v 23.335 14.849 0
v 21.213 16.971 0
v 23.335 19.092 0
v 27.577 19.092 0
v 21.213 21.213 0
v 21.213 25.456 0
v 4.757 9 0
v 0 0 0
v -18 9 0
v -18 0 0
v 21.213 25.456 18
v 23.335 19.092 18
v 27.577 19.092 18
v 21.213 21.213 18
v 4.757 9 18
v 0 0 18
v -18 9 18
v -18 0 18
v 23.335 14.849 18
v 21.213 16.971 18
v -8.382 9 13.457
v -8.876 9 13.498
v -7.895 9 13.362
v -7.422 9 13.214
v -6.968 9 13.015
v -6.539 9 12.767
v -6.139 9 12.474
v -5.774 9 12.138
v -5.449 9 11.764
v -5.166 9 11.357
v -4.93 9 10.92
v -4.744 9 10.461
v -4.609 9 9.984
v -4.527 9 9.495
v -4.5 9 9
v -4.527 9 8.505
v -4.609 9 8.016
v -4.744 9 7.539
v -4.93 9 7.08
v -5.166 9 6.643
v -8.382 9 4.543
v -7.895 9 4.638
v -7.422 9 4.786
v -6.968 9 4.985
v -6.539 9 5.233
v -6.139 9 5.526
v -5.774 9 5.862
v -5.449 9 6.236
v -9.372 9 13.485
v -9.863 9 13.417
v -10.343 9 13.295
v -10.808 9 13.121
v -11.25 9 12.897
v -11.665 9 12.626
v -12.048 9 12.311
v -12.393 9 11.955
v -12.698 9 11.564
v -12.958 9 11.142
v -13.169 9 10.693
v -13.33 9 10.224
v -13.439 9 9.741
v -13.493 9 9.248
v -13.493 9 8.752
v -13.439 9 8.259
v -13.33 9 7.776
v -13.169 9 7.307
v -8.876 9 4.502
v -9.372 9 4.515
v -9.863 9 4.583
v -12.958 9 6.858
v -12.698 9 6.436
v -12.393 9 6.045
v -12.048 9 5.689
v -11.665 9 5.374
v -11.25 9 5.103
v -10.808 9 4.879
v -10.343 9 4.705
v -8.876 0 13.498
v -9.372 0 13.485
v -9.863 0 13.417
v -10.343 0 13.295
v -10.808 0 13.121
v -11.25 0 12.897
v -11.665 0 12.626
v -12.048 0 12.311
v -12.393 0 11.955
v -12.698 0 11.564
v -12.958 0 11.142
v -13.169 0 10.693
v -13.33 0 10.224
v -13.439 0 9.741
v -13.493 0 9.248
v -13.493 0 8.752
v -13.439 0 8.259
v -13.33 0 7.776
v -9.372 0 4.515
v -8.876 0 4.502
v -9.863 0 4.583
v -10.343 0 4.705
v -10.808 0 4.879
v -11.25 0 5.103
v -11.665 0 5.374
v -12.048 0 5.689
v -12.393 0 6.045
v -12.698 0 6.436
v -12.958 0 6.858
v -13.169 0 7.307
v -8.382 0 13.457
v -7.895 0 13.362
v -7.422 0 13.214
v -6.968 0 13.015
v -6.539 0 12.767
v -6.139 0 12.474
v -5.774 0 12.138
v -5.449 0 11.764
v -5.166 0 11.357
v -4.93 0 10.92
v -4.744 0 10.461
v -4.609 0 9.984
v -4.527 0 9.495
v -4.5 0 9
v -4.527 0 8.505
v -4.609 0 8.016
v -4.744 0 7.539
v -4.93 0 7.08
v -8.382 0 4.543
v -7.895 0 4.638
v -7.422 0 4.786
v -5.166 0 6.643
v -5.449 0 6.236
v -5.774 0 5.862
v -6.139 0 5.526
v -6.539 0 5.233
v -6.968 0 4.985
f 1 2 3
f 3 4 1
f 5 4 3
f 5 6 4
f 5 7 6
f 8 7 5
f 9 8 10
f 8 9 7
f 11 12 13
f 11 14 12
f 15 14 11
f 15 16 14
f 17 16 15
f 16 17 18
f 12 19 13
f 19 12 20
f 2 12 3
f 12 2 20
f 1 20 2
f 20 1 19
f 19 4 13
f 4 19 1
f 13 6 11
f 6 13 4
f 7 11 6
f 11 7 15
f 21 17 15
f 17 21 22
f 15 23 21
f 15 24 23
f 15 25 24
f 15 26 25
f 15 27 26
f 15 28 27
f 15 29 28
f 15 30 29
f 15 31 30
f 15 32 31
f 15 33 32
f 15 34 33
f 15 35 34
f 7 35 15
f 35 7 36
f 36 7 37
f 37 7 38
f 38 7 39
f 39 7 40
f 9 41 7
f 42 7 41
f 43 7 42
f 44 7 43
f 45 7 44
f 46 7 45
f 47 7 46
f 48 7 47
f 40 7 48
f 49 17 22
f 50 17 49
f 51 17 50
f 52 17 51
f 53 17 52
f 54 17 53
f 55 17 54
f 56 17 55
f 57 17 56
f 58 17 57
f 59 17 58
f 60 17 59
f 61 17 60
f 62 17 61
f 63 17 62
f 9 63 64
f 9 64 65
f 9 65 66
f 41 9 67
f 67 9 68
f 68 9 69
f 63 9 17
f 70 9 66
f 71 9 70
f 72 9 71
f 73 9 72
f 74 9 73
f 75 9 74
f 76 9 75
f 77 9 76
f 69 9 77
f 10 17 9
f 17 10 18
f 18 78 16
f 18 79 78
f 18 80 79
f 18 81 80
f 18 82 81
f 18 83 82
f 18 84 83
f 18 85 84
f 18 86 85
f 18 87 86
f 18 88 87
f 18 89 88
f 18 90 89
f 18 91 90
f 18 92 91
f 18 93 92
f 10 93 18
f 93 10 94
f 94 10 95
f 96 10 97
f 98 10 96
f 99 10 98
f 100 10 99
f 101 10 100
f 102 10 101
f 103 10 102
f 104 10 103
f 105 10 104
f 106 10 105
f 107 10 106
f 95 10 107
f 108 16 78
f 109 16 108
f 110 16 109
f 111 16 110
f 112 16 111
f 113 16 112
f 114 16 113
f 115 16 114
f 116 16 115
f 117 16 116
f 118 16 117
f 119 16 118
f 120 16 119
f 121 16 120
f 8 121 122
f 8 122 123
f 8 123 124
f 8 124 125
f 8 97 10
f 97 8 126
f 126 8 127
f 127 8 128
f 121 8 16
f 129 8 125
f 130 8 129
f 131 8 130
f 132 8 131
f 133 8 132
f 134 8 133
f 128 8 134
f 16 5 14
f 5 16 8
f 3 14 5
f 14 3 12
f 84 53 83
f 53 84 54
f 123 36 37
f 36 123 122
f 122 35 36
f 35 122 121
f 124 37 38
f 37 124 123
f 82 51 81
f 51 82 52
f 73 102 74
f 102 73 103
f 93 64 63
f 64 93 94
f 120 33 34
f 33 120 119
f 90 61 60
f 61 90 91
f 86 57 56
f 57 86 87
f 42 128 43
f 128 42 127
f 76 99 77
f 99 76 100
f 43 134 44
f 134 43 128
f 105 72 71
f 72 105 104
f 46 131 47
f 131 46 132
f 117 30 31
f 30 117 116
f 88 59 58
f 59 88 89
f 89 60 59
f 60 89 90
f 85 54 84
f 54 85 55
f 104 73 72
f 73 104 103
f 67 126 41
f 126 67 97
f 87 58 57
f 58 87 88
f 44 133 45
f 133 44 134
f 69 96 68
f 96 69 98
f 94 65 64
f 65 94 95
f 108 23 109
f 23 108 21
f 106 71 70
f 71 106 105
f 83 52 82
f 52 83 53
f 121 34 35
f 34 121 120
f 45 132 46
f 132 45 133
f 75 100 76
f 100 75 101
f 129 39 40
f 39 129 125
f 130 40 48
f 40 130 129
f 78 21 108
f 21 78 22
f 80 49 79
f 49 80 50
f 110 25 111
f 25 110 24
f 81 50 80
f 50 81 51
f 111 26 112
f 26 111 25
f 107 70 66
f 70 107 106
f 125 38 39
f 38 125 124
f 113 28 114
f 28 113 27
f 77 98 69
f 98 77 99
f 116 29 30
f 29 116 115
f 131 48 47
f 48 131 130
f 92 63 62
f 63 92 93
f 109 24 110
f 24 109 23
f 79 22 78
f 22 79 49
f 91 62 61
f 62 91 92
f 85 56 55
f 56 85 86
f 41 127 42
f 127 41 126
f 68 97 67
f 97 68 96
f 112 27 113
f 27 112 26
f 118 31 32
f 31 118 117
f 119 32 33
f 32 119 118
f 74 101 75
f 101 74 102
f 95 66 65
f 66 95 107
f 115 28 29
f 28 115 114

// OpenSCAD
//a half of holder of L-profiles at 45 degrees
//Project: diy slider rail for diy dolly
$fa=1/1;
$fs=0.5/1;
part="rail_holder"; //[rail_holder,tripod_mount]
wall=3;
rod=9;
rod_distance=50;
thickness=3;
side=30;
screw=4;
bissl=0.01;
mount_width=30;
module rail_holder() {
  difference() {
    linear_extrude(2*rod,convexity=5) {
      rotate(45) {
        square([side,wall]);
        translate([side,-wall-thickness])square([wall,2*wall+thickness]);
        translate([side-wall,-wall-thickness])square([wall,wall]);
      }
      polygon([[0,0],[-2*rod,0],[-2*rod,rod],[rod,rod]]);
    }
    translate([-rod,-bissl,rod])rotate([-90,0,0])cylinder(d=rod,h=rod+2*bissl);
  }
}
module tripod_mount() {
  thick=rod+2*wall;
  size=rod+2*wall+rod_distance;
  difference() {
    translate([-mount_width/2,-size/2,0])cube([mount_width,size,thick]);
    translate([0,-rod_distance/2,thick/2])rotate([0,90,0])cylinder(d=rod,h=size+bissl,center=true);
    translate([0,rod_distance/2,thick/2])rotate([0,90,0])cylinder(d=rod,h=size+bissl,center=true);
    translate([0,0,2])cylinder(d=14,h=thick,$fn=6);
    translate([0,0,-bissl])cylinder(d=8,h=thick);
  }
}
if (part=="rail_holder") rail_holder();
if (part=="tripod_mount") tripod_mount();
